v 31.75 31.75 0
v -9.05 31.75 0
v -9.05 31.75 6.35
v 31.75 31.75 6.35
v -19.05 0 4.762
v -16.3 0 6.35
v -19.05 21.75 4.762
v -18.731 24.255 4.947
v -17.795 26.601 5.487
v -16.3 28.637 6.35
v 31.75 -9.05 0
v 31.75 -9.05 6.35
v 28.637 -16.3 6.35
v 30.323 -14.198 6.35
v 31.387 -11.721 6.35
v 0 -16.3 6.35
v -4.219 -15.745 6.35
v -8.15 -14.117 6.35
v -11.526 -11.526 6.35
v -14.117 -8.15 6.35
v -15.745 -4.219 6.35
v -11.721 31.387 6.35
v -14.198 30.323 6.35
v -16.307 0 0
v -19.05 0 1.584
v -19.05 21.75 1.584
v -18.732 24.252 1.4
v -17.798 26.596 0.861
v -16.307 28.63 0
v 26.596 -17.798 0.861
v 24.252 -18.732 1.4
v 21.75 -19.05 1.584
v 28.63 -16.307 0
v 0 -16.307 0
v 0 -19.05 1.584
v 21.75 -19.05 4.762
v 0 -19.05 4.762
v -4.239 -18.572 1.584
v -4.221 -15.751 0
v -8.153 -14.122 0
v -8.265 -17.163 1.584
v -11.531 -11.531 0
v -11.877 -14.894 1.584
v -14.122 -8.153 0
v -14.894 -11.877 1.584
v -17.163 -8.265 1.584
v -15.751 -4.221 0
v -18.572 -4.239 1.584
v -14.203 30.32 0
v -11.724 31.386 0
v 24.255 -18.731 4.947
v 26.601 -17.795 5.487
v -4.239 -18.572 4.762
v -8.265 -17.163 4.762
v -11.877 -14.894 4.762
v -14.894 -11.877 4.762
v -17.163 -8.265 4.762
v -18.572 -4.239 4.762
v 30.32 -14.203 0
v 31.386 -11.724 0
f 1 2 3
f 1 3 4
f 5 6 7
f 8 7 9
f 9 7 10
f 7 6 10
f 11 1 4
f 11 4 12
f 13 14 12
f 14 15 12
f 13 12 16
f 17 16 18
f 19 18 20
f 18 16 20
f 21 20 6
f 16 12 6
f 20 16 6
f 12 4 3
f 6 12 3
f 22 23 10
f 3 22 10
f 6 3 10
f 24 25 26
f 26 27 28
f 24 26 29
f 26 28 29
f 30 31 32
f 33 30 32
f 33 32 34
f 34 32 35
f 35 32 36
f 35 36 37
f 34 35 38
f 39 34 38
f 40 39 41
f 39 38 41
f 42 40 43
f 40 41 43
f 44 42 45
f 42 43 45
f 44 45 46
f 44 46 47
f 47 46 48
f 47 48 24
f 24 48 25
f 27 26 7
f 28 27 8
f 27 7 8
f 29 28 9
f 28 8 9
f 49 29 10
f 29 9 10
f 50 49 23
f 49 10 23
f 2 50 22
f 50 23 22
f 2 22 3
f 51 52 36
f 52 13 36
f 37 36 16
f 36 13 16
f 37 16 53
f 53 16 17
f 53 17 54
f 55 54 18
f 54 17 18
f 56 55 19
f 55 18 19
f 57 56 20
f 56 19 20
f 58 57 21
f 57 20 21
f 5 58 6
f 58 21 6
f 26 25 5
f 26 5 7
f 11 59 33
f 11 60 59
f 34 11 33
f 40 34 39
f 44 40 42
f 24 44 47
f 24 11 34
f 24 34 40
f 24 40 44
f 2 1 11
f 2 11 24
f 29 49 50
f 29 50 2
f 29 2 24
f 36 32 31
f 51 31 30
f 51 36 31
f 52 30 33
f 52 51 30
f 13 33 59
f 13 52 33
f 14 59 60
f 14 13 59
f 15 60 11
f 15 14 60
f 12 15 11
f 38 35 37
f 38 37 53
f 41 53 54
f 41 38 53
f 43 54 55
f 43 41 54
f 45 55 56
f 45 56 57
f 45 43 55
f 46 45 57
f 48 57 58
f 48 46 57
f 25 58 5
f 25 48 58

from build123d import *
from OCP.BRepFilletAPI import BRepFilletAPI_MakeChamfer

# Parameters (mm, degrees)
BOSS_EXTRUDE1_DEPTH = 6.35
CHAMFER1_SIZE       = 1.5875
CHAMFER1_SIZE2      = 2.749630657
CHAMFER2_SIZE       = 2.7432
CHAMFER2_SIZE2      = 1.583787258
FILLET1_R           = 10


with BuildPart() as part:
    # Sketch1 → Boss-Extrude1 (new body)
    with BuildSketch(Plane.XY):
        with BuildLine():
            Line((-19.05, 0), (-19.05, 31.75))
            Line((-19.05, 31.75), (31.75, 31.75))
            Line((31.75, 31.75), (31.75, -19.05))
            Line((31.75, -19.05), (0, -19.05))
            ThreePointArc((0, -19.05), (-13.470384182, -13.470384182), (-19.05, 0))
        make_face()
    extrude(amount=BOSS_EXTRUDE1_DEPTH)

    # Chamfer1: one chamfer whose edges measure the first distance from different faces: ONE call of the kernel's chamfer builder (chamfer() names one face for all edges)
    chamfer1_edges_1 = [part.edges().sort_by_distance(p)[0] for p in [
        (-19.05, 15.875, 6.35),
    ]]
    chamfer1_side_1 = [part.faces().sort_by_distance(p)[0] for p in [
        (-19.05, 15.875, 3.175),
    ]]
    chamfer1_edges_2 = [part.edges().sort_by_distance(p)[0] for p in [
        (-13.470384182, -13.470384182, 6.35),
    ]]
    chamfer1_side_2 = [part.faces().sort_by_distance(p)[0] for p in [
        (-13.470384182, -13.470384182, 3.175),
    ]]
    chamfer1_edges_3 = [part.edges().sort_by_distance(p)[0] for p in [
        (15.875, -19.05, 6.35),
    ]]
    chamfer1_side_3 = [part.faces().sort_by_distance(p)[0] for p in [
        (15.875, -19.05, 3.175),
    ]]
    chamfer1 = BRepFilletAPI_MakeChamfer(part.part.solid().wrapped)
    for e in chamfer1_edges_1:
        chamfer1.Add(CHAMFER1_SIZE, CHAMFER1_SIZE2, e.wrapped, chamfer1_side_1[0].wrapped)  # the first distance lies on this face
    for e in chamfer1_edges_2:
        chamfer1.Add(CHAMFER1_SIZE, CHAMFER1_SIZE2, e.wrapped, chamfer1_side_2[0].wrapped)  # the first distance lies on this face
    for e in chamfer1_edges_3:
        chamfer1.Add(CHAMFER1_SIZE, CHAMFER1_SIZE2, e.wrapped, chamfer1_side_3[0].wrapped)  # the first distance lies on this face
    add(Compound.cast(chamfer1.Shape()), mode=Mode.REPLACE)

    # Chamfer2
    chamfer2_edges = [part.edges().sort_by_distance(p)[0] for p in [
        (-19.05, 15.875, 0),
        (15.875, -19.05, 0),
        (-13.470384182, -13.470384182, 0),
    ]]
    chamfer2_side = [part.faces().sort_by_distance(p)[0] for p in [
        (7.007973691, 7.007973691, 0),
    ]]
    chamfer(chamfer2_edges, length=CHAMFER2_SIZE, length2=CHAMFER2_SIZE2, reference=chamfer2_side[0])

    # Fillet1
    fillet1_edges = [part.edges().sort_by_distance(p)[0] for p in [
        (31.75, -19.05, 3.173143629),
        (-19.05, 31.75, 3.173143629),
    ]]
    fillet(fillet1_edges, radius=FILLET1_R)


solid = part.part
